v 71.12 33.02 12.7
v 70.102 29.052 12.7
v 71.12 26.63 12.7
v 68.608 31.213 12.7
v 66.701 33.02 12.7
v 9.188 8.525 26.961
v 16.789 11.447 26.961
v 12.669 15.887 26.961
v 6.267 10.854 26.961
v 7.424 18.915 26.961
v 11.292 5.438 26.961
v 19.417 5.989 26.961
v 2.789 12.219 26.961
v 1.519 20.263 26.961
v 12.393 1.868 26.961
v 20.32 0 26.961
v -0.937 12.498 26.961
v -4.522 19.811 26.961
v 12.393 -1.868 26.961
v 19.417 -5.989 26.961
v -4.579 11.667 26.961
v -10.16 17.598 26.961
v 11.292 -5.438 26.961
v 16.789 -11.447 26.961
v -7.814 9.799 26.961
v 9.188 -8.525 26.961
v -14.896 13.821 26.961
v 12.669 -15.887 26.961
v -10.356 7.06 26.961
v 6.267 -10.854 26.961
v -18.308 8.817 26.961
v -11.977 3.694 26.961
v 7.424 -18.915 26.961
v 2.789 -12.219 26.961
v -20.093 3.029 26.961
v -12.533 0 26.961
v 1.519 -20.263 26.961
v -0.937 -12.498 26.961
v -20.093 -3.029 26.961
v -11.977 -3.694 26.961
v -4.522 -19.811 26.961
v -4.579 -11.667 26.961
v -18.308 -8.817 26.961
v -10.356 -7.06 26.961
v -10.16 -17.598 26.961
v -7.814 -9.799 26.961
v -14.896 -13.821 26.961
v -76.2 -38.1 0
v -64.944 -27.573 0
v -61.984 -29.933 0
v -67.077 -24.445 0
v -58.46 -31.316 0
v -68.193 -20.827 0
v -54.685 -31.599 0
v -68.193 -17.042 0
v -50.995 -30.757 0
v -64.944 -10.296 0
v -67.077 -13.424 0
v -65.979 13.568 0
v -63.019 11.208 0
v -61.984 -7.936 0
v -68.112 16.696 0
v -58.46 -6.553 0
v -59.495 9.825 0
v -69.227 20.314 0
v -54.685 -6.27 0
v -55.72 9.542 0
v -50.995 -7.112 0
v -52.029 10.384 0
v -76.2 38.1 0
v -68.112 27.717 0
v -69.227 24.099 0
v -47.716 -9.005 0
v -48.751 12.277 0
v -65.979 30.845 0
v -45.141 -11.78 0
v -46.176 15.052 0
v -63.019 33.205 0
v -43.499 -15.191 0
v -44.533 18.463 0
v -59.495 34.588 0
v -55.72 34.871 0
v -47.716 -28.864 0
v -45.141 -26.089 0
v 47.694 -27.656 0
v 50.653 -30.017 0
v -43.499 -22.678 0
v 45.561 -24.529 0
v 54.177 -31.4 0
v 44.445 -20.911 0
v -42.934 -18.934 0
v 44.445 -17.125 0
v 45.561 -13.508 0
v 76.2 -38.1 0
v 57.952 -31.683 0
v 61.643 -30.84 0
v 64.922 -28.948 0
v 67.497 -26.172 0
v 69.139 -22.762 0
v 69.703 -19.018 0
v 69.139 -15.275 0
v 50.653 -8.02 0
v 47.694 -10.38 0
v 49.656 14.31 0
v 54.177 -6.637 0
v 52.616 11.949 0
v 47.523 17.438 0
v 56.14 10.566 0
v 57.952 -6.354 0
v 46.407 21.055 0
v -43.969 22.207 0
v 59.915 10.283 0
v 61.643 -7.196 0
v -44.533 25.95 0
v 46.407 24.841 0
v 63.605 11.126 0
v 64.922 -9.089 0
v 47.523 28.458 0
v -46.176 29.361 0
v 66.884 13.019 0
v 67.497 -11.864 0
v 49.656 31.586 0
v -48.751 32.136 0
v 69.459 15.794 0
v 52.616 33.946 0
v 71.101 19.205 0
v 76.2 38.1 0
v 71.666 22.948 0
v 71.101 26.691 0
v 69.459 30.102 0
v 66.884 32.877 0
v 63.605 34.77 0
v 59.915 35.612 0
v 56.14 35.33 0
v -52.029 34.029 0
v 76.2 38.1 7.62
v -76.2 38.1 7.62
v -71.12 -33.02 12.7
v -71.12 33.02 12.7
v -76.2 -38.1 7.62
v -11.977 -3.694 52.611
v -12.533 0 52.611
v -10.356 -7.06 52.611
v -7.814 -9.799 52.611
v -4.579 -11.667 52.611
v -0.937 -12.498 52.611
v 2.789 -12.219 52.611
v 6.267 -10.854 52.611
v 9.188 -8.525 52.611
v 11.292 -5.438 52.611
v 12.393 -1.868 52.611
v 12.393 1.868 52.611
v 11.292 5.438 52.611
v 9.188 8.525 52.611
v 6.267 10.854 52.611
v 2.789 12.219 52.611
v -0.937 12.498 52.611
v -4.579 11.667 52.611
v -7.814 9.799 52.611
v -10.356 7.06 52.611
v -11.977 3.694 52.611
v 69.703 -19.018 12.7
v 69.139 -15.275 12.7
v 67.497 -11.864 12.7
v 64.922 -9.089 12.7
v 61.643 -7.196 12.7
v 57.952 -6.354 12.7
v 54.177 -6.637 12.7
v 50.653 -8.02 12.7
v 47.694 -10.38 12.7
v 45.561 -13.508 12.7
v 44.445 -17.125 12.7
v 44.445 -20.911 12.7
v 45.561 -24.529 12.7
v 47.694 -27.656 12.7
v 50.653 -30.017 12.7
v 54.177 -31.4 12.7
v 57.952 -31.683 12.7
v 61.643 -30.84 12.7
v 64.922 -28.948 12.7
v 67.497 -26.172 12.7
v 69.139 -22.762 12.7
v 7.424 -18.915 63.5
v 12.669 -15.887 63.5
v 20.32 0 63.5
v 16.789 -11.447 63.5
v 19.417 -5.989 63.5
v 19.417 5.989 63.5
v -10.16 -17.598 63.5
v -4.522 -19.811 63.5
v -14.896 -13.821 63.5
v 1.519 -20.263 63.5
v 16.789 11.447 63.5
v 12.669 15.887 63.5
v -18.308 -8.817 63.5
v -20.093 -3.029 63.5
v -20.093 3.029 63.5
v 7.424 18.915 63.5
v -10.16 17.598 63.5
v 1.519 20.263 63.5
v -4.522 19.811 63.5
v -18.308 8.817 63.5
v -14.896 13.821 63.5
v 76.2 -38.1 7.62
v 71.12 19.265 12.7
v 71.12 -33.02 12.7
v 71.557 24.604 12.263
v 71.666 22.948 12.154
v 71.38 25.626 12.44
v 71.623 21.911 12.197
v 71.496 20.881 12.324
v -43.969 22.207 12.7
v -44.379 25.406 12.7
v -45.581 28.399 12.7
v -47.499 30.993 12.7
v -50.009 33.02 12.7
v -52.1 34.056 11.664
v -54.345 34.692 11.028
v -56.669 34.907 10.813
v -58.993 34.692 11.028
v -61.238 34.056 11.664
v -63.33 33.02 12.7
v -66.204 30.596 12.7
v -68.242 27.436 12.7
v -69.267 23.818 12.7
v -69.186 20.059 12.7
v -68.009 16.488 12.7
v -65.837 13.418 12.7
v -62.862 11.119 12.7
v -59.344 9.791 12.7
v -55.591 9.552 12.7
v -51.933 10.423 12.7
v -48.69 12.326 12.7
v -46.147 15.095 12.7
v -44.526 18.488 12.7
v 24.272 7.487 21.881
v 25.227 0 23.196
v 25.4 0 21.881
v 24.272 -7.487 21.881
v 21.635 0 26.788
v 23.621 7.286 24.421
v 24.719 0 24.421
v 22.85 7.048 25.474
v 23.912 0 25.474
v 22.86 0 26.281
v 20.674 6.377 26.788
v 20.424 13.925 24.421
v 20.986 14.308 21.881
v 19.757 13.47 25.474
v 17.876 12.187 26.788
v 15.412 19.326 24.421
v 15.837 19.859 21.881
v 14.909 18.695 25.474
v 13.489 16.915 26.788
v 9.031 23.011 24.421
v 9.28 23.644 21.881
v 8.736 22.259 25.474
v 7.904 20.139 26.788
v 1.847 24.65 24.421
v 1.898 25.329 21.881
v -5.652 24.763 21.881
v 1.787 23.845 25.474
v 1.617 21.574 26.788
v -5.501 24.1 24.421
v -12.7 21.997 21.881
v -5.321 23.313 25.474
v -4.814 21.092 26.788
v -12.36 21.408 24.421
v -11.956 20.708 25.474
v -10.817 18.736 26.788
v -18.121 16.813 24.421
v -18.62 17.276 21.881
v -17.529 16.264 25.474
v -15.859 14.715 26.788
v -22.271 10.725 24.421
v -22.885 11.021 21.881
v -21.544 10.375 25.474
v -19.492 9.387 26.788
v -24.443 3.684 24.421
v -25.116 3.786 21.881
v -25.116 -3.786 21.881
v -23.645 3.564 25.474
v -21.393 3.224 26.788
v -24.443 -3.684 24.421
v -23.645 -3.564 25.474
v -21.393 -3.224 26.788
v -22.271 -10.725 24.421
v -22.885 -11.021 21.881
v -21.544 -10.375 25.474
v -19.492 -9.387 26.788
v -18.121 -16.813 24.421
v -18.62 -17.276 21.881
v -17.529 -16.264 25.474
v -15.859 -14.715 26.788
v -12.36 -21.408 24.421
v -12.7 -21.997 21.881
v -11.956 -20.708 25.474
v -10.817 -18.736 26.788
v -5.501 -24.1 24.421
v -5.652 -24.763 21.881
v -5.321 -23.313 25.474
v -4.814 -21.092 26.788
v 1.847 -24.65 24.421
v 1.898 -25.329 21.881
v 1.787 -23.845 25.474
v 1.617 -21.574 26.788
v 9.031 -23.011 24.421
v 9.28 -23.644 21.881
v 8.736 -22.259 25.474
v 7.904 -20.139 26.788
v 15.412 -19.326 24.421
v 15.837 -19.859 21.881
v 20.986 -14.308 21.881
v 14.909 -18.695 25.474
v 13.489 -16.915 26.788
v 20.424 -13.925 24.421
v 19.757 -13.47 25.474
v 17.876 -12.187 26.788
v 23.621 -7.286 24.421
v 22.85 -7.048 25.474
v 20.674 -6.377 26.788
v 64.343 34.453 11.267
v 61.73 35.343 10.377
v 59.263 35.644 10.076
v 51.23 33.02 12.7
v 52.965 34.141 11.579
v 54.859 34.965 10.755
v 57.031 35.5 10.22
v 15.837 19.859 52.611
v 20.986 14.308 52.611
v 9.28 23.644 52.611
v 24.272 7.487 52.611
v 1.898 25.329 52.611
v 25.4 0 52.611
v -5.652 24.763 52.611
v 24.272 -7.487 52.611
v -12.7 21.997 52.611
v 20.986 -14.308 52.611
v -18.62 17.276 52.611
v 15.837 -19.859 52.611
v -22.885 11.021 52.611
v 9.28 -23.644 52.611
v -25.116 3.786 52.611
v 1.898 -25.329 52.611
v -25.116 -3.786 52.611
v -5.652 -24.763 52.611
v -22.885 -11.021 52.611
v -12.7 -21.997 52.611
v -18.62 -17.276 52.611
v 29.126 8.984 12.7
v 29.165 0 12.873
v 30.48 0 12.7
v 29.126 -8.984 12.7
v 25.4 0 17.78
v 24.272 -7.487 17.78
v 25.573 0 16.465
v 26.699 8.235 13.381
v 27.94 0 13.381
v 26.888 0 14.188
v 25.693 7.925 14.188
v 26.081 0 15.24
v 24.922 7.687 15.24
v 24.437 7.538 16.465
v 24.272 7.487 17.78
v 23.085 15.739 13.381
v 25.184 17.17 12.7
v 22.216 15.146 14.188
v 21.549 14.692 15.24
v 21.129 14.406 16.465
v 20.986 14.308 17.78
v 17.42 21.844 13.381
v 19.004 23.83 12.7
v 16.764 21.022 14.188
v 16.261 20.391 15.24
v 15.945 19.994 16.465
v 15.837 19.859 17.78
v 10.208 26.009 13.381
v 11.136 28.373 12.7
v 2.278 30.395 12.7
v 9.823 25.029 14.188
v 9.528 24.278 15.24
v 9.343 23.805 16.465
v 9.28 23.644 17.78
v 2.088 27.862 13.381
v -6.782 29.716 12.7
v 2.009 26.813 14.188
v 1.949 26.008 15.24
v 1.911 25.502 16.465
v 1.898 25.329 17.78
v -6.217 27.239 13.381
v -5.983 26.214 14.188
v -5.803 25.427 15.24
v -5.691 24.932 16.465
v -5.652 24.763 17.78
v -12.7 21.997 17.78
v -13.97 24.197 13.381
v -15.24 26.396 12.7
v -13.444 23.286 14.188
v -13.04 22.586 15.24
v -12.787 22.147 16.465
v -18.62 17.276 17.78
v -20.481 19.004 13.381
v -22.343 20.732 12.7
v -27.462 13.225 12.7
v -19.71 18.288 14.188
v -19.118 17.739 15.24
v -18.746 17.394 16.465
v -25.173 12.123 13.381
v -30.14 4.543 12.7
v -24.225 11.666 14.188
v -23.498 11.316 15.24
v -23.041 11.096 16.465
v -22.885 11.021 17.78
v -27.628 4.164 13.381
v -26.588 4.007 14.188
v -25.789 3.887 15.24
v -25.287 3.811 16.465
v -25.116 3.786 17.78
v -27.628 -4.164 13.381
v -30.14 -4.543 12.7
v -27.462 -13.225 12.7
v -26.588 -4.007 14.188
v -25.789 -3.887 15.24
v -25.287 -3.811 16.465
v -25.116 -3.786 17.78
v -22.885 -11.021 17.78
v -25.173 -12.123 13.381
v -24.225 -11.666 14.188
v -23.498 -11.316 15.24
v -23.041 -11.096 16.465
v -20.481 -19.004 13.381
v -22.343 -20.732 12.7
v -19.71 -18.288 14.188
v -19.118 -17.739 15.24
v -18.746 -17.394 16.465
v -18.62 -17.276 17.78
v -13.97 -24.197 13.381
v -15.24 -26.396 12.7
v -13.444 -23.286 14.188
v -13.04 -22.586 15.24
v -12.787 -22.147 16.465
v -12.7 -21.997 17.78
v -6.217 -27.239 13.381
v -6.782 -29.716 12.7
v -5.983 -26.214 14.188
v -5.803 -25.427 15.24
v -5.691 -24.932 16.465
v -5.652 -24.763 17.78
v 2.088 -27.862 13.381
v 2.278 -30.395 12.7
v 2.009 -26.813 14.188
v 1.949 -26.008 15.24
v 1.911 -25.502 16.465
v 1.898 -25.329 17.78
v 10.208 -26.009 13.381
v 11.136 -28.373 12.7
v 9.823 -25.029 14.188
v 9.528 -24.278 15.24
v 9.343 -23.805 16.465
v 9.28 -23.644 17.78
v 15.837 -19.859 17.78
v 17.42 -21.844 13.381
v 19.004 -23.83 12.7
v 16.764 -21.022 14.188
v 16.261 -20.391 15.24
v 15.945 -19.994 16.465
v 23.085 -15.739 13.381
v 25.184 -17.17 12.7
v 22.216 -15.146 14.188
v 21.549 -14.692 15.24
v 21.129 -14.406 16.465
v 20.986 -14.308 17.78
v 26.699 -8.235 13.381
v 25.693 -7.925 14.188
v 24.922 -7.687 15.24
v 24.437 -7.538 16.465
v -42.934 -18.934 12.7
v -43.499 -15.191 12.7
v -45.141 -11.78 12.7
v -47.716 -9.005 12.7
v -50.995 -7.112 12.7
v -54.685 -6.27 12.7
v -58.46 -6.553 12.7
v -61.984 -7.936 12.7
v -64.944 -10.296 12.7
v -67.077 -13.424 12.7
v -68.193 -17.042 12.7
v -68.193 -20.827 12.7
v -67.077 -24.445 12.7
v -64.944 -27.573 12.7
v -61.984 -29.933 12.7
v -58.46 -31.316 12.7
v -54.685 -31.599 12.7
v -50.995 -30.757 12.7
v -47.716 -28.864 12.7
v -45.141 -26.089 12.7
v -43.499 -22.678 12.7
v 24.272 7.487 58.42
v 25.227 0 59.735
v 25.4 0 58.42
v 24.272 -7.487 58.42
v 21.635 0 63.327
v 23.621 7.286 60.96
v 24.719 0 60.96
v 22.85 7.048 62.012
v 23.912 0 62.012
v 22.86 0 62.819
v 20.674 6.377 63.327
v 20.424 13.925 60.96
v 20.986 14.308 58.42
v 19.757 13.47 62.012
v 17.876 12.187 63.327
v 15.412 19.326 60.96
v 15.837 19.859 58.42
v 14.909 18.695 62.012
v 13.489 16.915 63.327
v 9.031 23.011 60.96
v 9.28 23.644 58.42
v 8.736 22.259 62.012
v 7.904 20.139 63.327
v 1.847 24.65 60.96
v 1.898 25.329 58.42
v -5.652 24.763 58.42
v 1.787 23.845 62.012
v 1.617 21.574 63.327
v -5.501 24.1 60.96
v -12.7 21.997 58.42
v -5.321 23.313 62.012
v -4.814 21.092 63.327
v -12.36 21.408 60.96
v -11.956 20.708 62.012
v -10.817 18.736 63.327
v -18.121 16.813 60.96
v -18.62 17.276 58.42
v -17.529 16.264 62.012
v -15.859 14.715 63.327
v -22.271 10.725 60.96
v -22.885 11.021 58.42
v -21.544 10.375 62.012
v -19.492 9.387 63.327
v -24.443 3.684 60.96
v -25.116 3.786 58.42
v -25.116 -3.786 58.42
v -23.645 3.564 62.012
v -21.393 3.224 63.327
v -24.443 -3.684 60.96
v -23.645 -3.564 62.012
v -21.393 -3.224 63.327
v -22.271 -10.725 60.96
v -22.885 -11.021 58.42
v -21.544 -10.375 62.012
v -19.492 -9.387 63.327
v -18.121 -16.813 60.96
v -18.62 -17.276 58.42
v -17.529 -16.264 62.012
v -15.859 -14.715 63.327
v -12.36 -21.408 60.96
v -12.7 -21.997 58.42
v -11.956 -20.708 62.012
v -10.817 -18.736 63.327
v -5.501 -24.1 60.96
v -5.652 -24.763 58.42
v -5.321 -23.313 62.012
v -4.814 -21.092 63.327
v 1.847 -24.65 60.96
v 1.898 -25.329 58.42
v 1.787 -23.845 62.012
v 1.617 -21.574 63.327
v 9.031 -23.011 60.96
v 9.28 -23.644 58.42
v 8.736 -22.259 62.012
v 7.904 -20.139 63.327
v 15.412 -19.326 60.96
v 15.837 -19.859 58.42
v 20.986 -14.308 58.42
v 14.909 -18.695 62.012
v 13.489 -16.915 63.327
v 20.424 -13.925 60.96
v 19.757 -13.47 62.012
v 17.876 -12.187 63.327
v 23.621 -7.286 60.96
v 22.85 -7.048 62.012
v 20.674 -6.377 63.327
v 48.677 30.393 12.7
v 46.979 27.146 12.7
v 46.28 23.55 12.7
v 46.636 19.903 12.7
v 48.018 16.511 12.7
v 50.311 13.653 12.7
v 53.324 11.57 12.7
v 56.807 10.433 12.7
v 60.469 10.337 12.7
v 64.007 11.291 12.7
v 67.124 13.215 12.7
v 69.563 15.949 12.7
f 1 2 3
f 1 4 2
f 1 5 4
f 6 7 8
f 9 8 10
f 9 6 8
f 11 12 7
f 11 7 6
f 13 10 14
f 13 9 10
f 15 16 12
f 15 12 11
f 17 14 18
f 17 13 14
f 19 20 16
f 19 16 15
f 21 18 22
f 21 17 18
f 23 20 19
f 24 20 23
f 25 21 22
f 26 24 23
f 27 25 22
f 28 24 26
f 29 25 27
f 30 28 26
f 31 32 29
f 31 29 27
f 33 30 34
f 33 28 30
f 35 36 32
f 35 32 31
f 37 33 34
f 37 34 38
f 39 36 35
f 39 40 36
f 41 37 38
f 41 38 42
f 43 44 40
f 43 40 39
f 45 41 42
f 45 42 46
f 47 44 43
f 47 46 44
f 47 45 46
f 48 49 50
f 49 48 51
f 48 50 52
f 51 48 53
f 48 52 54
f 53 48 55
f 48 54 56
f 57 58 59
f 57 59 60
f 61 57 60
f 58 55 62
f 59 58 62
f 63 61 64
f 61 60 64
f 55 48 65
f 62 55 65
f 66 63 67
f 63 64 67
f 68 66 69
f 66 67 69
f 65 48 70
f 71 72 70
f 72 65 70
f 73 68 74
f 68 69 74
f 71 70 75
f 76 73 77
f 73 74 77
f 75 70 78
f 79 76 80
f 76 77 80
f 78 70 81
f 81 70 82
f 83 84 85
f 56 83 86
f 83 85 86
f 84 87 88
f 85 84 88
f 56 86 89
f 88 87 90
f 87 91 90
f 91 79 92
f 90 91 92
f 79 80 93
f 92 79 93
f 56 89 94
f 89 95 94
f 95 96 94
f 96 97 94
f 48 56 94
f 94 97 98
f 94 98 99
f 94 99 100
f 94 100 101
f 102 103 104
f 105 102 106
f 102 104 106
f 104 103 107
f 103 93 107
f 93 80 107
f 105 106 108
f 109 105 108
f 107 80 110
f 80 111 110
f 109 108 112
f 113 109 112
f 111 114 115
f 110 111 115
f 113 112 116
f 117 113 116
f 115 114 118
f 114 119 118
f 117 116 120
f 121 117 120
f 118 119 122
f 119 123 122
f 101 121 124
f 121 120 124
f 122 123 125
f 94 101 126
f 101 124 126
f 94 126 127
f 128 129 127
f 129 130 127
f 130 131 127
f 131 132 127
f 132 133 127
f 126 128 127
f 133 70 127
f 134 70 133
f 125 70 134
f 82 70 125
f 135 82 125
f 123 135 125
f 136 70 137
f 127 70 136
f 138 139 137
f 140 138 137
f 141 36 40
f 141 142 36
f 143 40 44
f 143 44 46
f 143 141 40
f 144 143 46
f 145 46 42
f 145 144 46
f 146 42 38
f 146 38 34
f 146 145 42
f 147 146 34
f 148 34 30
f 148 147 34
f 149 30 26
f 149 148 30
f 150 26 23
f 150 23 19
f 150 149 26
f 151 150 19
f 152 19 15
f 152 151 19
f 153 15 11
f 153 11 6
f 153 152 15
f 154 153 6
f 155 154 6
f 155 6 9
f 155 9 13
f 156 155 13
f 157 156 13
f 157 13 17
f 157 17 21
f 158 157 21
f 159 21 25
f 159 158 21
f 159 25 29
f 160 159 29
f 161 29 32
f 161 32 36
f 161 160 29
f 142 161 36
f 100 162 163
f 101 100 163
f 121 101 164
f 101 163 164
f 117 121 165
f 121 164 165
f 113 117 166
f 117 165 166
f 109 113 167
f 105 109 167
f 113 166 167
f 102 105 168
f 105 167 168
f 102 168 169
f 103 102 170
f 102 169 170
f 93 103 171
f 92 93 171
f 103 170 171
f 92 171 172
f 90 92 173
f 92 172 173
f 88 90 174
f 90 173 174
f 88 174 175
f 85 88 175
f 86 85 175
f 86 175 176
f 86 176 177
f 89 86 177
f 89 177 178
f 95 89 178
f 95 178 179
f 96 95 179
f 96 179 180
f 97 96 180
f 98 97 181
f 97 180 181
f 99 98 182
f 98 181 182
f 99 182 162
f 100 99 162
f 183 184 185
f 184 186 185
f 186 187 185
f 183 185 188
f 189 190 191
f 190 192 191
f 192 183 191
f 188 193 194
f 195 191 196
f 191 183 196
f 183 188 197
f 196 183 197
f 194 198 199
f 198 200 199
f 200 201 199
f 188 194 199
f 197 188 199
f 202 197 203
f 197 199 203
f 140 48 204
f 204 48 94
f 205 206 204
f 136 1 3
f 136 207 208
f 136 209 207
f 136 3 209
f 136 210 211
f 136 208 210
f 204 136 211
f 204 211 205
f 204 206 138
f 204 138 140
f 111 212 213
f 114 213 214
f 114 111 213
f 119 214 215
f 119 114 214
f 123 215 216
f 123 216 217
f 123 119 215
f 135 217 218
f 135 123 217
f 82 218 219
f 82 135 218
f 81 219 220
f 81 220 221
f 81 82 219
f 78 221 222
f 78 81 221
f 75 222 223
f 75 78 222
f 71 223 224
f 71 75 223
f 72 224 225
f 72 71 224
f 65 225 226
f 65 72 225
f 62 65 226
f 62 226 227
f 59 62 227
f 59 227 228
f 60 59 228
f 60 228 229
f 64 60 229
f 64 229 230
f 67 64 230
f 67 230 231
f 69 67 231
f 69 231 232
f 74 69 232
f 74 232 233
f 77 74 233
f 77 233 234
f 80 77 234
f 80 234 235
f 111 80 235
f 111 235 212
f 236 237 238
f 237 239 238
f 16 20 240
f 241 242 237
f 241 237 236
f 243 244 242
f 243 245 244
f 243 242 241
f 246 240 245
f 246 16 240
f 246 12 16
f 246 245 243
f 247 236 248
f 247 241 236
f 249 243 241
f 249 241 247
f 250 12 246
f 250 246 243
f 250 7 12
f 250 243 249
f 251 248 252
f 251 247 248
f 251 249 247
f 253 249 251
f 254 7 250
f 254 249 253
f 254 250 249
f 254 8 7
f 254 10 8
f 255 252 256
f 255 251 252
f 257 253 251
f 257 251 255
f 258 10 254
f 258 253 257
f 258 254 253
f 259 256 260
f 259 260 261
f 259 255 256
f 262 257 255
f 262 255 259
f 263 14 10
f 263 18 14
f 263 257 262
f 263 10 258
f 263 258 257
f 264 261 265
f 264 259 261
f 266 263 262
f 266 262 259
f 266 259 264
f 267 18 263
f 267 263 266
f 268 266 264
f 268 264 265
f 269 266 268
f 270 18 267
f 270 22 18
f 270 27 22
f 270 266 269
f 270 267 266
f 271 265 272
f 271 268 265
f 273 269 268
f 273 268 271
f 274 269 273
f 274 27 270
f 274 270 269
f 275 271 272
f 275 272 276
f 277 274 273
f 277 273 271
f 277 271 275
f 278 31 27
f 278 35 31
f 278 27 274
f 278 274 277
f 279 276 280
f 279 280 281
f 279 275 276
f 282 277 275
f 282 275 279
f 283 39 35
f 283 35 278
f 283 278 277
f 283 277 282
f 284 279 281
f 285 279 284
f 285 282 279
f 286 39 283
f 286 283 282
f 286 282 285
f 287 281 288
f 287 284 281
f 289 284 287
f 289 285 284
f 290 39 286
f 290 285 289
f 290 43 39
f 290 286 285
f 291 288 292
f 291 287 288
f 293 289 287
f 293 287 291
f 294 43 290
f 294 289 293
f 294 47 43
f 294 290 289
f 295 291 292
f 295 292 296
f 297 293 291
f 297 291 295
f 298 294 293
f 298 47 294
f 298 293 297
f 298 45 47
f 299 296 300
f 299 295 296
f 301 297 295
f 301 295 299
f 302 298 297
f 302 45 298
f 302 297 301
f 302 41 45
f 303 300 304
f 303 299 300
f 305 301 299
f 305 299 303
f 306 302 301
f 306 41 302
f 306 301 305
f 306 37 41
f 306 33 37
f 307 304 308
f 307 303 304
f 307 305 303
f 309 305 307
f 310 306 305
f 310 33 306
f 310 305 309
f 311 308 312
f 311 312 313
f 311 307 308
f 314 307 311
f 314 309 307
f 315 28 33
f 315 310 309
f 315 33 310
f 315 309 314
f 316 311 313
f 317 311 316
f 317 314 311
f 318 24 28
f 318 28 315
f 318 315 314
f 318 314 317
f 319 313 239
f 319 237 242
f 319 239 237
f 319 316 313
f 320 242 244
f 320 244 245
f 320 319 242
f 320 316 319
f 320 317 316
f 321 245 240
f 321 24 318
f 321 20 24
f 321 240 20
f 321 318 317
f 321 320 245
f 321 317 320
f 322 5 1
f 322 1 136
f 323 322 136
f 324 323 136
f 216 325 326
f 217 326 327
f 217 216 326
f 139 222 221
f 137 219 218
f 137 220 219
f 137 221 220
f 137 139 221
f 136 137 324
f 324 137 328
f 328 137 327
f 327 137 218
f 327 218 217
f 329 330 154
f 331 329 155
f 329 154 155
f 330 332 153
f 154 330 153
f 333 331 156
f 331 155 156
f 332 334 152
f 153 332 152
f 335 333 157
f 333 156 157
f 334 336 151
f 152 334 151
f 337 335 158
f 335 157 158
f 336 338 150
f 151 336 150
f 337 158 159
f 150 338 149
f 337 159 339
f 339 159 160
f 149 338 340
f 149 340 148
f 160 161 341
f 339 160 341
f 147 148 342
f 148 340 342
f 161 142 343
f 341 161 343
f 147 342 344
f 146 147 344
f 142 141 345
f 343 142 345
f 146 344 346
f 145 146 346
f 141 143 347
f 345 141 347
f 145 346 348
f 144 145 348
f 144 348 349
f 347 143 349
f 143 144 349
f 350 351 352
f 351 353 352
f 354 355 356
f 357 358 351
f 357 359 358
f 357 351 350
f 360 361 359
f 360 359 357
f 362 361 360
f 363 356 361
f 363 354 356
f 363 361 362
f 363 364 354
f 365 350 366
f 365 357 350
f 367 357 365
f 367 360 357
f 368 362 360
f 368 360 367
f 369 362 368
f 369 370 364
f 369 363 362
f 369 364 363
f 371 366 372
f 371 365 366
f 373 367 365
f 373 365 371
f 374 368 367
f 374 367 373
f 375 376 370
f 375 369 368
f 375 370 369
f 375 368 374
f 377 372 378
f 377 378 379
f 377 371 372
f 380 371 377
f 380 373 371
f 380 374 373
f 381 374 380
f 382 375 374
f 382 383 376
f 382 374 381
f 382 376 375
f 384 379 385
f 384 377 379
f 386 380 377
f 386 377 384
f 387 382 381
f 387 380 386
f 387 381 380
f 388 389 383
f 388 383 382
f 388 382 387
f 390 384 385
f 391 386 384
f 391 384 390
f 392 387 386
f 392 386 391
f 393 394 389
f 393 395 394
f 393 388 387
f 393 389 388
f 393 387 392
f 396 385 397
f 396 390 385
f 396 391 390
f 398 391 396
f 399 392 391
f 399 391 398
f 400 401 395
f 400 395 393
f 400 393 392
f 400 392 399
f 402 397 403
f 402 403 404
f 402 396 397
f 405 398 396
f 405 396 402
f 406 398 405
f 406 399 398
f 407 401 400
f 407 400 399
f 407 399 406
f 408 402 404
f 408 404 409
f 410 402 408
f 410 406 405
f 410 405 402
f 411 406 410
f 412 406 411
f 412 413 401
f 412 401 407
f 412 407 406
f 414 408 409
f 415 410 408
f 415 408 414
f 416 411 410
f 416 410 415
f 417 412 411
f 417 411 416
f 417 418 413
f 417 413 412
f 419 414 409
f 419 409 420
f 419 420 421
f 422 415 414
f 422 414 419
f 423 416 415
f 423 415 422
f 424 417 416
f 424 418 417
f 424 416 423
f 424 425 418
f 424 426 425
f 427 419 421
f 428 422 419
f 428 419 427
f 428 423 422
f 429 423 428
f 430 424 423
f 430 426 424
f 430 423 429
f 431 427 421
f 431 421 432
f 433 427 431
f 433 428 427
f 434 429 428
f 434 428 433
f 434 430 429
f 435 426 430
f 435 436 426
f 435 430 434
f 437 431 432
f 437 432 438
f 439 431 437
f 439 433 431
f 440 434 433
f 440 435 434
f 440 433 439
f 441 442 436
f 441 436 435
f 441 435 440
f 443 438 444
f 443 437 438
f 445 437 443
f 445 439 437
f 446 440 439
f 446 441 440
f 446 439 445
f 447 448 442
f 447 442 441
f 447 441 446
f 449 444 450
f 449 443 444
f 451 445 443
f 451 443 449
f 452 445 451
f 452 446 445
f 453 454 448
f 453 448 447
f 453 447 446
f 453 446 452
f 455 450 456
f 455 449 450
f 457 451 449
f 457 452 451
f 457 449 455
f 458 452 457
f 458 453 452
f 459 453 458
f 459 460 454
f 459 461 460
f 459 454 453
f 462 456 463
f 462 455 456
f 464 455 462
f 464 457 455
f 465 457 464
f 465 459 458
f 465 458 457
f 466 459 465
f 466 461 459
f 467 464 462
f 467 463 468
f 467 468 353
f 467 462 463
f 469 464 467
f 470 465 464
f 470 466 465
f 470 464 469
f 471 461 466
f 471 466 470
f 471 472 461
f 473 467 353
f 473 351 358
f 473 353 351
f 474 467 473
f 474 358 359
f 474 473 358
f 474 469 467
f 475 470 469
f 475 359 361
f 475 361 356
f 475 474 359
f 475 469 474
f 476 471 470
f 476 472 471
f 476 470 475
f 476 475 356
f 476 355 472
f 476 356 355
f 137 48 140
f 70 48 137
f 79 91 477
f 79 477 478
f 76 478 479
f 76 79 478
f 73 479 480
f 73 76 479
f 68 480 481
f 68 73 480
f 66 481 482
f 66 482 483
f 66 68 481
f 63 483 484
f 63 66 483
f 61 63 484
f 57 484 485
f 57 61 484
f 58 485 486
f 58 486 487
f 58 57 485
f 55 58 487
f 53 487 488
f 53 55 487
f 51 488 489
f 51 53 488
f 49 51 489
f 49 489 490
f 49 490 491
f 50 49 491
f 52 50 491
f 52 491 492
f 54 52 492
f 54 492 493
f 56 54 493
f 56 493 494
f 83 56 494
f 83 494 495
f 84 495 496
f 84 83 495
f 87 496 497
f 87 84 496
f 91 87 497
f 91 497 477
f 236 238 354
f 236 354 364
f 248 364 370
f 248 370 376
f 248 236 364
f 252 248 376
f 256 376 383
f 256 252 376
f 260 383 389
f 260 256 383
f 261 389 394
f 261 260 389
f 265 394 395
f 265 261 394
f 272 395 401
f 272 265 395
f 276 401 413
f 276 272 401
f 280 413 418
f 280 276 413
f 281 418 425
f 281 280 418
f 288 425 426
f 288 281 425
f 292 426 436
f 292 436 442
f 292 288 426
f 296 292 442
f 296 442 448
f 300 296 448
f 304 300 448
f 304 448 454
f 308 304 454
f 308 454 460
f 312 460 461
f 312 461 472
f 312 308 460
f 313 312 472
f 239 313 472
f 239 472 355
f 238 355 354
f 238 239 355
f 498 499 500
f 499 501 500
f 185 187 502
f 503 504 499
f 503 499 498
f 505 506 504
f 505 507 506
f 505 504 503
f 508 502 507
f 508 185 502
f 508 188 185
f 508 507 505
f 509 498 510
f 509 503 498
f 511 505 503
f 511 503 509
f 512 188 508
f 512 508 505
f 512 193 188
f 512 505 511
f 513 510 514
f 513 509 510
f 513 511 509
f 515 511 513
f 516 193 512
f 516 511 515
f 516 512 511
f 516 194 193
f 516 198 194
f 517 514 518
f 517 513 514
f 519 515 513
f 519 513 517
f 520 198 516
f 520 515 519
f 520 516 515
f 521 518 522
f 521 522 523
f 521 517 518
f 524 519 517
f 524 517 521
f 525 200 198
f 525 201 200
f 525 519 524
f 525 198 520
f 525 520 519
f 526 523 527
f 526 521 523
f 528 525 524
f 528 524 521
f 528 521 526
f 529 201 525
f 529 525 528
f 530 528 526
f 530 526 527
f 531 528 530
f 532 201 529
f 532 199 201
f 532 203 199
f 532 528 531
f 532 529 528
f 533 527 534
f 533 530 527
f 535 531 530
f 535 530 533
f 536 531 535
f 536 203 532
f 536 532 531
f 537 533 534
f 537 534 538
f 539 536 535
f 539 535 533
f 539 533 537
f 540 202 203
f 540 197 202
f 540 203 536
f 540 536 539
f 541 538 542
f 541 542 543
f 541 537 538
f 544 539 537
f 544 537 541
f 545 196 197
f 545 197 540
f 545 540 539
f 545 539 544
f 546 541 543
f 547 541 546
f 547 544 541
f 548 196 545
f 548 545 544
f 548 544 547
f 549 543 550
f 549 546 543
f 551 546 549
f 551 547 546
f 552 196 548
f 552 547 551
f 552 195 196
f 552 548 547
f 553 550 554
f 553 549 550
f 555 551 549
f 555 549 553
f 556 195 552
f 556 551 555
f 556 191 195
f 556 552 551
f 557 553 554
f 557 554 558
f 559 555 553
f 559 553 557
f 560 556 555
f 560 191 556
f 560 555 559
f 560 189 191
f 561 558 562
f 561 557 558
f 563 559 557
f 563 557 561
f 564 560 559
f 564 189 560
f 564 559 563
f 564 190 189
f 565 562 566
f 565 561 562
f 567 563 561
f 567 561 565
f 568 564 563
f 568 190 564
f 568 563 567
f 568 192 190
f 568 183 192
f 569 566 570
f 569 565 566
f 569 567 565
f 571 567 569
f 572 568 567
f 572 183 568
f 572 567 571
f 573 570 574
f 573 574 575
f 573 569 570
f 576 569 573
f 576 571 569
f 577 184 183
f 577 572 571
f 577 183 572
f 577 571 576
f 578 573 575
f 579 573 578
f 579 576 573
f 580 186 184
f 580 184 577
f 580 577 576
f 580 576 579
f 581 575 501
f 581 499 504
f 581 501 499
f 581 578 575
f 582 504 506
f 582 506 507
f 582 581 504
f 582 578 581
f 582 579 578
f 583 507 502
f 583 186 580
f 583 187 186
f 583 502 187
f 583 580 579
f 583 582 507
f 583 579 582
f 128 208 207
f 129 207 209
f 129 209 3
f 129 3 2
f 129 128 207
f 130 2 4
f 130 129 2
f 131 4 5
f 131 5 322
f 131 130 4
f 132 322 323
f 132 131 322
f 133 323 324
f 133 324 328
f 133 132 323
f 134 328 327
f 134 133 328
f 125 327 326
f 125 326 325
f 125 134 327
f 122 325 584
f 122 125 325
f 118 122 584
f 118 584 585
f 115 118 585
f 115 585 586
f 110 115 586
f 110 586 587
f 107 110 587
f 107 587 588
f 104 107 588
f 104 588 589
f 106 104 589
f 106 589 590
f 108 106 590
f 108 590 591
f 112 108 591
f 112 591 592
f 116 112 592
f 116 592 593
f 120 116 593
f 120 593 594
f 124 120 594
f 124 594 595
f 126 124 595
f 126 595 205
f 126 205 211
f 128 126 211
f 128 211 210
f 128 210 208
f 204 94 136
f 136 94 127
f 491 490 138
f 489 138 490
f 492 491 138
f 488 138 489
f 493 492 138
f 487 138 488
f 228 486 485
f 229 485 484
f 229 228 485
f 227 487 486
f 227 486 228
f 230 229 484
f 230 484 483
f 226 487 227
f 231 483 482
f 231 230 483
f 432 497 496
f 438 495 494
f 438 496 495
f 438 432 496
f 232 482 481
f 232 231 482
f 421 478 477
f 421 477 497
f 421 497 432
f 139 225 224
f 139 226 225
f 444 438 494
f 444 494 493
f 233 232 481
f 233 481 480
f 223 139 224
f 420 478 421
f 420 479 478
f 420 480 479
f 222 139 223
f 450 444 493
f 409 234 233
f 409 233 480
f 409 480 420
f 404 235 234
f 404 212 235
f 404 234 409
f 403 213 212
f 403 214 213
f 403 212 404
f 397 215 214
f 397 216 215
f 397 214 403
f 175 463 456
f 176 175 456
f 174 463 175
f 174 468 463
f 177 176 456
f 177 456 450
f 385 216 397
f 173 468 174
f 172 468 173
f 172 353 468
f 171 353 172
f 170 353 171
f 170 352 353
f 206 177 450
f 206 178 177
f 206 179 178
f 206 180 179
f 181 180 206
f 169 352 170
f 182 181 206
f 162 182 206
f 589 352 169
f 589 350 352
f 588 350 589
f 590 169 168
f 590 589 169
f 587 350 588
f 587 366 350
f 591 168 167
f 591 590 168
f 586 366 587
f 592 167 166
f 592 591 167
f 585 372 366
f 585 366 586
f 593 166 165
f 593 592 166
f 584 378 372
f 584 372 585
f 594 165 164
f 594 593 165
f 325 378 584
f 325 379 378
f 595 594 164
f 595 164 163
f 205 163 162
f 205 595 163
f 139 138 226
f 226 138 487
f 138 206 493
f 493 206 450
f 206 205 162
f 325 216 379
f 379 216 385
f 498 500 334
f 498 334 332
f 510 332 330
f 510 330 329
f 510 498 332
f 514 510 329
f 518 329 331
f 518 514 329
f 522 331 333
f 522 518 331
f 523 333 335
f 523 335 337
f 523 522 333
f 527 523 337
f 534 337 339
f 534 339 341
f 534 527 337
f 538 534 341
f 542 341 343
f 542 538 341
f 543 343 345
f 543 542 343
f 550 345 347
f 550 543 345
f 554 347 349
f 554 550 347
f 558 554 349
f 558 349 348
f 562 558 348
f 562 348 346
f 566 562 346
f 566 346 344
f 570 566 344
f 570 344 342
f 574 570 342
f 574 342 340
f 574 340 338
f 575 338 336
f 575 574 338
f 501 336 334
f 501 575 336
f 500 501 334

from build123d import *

# Parameters (mm, degrees)
F0_W         = 152.4
F0_H         = 76.2
F1_DEPTH     = 12.7
F2_R         = 12.7
F3_DEPTH     = 12.7
F4_R         = 12.7
F5_DEPTH     = 12.7
F6_R         = 12.7
F7_DEPTH     = 12.7
F8_W         = 25.4
F8_H         = 50.8
F11_W        = 22.735084407
F11_H        = 25.6498381495
F13_R        = 5.08
F14_T1_DEPTH = 178.5282991577
F14_T3_DEPTH = 102.3282991577


# Not quite as in the source:
# - a fillet or chamfer that OpenCascade refuses, or shapes differently, is made with other operations: its cross-section is extruded or revolved along the edge and cut away or added


with BuildPart() as f1:
    # F0 (on Top) → F1 (new body)
    with BuildSketch(Plane.XY):
        Rectangle(F0_W, F0_H)
    extrude(amount=F1_DEPTH)

    # F2 (on face) → F3 (cut)
    with BuildSketch(Plane.XY.offset(12.7)):
        with Locations((57.0033815651, -19.0182915657)):
            Circle(F2_R)
    extrude(amount=-F3_DEPTH, mode=Mode.SUBTRACT)

    # F4 (on Top) → F5 (cut)
    with BuildSketch(Plane.XY):
        with Locations((-55.634457748, -18.9344183354)):
            Circle(F4_R)
    extrude(amount=F5_DEPTH, mode=Mode.SUBTRACT)

    # F6 (on Top) → F7 (cut)
    with BuildSketch(Plane.XY):
        with Locations((-56.6692140824, 22.2065947787)):
            Circle(F6_R)
        with Locations((58.9656175097, 22.9479158466)):
            Circle(F6_R)
    extrude(amount=F7_DEPTH, mode=Mode.SUBTRACT)

    # F8 (on Front) → F9 (revolve)
    with BuildSketch(Plane.XZ):
        with Locations((12.7, 38.1)):
            Rectangle(F8_W, F8_H)
    revolve(axis=Axis((0, 0, 38.1), (0, 0, 1)))

    # F11 (on Front) → F12 (revolve, cut)
    with BuildSketch(Plane.XZ):
        with Locations((-23.9009843208, 39.7863946855)):
            Rectangle(F11_W, F11_H)
    revolve(axis=Axis((0, 0, 31.6979512572), (0, 0, 1)), mode=Mode.SUBTRACT)

    # F13
    f13_edges = [f1.edges().sort_by_distance(p)[0] for p in [
        (-25.4, 0, 63.5),
        (-25.4, 0, 26.961476),
        (-25.4, 0, 12.7),
    ]]
    fillet(f13_edges, radius=F13_R)

    # F14: chamfer of 5.08 on 4 edges, made by hand

    # F14_s2 → F14_t1 (cut)
    with BuildSketch(Plane.YZ.offset(-89.2641495789)):
        Polygon((-33.02, 12.7), (-38.1, 7.62), (-38.1, 12.7), align=None)
        Polygon((33.02, 12.7), (38.1, 7.62), (38.1, 12.7), align=None)
    extrude(amount=F14_T1_DEPTH, mode=Mode.SUBTRACT)

    # F14_s4 → F14_t3 (cut)
    with BuildSketch(Plane.XZ.offset(-51.1641495789)):
        Polygon((-71.12, 12.7), (-76.2, 7.62), (-76.2, 12.7), align=None)
        Polygon((71.12, 12.7), (76.2, 7.62), (76.2, 12.7), align=None)
    extrude(amount=F14_T3_DEPTH, mode=Mode.SUBTRACT)


solid = f1.part
